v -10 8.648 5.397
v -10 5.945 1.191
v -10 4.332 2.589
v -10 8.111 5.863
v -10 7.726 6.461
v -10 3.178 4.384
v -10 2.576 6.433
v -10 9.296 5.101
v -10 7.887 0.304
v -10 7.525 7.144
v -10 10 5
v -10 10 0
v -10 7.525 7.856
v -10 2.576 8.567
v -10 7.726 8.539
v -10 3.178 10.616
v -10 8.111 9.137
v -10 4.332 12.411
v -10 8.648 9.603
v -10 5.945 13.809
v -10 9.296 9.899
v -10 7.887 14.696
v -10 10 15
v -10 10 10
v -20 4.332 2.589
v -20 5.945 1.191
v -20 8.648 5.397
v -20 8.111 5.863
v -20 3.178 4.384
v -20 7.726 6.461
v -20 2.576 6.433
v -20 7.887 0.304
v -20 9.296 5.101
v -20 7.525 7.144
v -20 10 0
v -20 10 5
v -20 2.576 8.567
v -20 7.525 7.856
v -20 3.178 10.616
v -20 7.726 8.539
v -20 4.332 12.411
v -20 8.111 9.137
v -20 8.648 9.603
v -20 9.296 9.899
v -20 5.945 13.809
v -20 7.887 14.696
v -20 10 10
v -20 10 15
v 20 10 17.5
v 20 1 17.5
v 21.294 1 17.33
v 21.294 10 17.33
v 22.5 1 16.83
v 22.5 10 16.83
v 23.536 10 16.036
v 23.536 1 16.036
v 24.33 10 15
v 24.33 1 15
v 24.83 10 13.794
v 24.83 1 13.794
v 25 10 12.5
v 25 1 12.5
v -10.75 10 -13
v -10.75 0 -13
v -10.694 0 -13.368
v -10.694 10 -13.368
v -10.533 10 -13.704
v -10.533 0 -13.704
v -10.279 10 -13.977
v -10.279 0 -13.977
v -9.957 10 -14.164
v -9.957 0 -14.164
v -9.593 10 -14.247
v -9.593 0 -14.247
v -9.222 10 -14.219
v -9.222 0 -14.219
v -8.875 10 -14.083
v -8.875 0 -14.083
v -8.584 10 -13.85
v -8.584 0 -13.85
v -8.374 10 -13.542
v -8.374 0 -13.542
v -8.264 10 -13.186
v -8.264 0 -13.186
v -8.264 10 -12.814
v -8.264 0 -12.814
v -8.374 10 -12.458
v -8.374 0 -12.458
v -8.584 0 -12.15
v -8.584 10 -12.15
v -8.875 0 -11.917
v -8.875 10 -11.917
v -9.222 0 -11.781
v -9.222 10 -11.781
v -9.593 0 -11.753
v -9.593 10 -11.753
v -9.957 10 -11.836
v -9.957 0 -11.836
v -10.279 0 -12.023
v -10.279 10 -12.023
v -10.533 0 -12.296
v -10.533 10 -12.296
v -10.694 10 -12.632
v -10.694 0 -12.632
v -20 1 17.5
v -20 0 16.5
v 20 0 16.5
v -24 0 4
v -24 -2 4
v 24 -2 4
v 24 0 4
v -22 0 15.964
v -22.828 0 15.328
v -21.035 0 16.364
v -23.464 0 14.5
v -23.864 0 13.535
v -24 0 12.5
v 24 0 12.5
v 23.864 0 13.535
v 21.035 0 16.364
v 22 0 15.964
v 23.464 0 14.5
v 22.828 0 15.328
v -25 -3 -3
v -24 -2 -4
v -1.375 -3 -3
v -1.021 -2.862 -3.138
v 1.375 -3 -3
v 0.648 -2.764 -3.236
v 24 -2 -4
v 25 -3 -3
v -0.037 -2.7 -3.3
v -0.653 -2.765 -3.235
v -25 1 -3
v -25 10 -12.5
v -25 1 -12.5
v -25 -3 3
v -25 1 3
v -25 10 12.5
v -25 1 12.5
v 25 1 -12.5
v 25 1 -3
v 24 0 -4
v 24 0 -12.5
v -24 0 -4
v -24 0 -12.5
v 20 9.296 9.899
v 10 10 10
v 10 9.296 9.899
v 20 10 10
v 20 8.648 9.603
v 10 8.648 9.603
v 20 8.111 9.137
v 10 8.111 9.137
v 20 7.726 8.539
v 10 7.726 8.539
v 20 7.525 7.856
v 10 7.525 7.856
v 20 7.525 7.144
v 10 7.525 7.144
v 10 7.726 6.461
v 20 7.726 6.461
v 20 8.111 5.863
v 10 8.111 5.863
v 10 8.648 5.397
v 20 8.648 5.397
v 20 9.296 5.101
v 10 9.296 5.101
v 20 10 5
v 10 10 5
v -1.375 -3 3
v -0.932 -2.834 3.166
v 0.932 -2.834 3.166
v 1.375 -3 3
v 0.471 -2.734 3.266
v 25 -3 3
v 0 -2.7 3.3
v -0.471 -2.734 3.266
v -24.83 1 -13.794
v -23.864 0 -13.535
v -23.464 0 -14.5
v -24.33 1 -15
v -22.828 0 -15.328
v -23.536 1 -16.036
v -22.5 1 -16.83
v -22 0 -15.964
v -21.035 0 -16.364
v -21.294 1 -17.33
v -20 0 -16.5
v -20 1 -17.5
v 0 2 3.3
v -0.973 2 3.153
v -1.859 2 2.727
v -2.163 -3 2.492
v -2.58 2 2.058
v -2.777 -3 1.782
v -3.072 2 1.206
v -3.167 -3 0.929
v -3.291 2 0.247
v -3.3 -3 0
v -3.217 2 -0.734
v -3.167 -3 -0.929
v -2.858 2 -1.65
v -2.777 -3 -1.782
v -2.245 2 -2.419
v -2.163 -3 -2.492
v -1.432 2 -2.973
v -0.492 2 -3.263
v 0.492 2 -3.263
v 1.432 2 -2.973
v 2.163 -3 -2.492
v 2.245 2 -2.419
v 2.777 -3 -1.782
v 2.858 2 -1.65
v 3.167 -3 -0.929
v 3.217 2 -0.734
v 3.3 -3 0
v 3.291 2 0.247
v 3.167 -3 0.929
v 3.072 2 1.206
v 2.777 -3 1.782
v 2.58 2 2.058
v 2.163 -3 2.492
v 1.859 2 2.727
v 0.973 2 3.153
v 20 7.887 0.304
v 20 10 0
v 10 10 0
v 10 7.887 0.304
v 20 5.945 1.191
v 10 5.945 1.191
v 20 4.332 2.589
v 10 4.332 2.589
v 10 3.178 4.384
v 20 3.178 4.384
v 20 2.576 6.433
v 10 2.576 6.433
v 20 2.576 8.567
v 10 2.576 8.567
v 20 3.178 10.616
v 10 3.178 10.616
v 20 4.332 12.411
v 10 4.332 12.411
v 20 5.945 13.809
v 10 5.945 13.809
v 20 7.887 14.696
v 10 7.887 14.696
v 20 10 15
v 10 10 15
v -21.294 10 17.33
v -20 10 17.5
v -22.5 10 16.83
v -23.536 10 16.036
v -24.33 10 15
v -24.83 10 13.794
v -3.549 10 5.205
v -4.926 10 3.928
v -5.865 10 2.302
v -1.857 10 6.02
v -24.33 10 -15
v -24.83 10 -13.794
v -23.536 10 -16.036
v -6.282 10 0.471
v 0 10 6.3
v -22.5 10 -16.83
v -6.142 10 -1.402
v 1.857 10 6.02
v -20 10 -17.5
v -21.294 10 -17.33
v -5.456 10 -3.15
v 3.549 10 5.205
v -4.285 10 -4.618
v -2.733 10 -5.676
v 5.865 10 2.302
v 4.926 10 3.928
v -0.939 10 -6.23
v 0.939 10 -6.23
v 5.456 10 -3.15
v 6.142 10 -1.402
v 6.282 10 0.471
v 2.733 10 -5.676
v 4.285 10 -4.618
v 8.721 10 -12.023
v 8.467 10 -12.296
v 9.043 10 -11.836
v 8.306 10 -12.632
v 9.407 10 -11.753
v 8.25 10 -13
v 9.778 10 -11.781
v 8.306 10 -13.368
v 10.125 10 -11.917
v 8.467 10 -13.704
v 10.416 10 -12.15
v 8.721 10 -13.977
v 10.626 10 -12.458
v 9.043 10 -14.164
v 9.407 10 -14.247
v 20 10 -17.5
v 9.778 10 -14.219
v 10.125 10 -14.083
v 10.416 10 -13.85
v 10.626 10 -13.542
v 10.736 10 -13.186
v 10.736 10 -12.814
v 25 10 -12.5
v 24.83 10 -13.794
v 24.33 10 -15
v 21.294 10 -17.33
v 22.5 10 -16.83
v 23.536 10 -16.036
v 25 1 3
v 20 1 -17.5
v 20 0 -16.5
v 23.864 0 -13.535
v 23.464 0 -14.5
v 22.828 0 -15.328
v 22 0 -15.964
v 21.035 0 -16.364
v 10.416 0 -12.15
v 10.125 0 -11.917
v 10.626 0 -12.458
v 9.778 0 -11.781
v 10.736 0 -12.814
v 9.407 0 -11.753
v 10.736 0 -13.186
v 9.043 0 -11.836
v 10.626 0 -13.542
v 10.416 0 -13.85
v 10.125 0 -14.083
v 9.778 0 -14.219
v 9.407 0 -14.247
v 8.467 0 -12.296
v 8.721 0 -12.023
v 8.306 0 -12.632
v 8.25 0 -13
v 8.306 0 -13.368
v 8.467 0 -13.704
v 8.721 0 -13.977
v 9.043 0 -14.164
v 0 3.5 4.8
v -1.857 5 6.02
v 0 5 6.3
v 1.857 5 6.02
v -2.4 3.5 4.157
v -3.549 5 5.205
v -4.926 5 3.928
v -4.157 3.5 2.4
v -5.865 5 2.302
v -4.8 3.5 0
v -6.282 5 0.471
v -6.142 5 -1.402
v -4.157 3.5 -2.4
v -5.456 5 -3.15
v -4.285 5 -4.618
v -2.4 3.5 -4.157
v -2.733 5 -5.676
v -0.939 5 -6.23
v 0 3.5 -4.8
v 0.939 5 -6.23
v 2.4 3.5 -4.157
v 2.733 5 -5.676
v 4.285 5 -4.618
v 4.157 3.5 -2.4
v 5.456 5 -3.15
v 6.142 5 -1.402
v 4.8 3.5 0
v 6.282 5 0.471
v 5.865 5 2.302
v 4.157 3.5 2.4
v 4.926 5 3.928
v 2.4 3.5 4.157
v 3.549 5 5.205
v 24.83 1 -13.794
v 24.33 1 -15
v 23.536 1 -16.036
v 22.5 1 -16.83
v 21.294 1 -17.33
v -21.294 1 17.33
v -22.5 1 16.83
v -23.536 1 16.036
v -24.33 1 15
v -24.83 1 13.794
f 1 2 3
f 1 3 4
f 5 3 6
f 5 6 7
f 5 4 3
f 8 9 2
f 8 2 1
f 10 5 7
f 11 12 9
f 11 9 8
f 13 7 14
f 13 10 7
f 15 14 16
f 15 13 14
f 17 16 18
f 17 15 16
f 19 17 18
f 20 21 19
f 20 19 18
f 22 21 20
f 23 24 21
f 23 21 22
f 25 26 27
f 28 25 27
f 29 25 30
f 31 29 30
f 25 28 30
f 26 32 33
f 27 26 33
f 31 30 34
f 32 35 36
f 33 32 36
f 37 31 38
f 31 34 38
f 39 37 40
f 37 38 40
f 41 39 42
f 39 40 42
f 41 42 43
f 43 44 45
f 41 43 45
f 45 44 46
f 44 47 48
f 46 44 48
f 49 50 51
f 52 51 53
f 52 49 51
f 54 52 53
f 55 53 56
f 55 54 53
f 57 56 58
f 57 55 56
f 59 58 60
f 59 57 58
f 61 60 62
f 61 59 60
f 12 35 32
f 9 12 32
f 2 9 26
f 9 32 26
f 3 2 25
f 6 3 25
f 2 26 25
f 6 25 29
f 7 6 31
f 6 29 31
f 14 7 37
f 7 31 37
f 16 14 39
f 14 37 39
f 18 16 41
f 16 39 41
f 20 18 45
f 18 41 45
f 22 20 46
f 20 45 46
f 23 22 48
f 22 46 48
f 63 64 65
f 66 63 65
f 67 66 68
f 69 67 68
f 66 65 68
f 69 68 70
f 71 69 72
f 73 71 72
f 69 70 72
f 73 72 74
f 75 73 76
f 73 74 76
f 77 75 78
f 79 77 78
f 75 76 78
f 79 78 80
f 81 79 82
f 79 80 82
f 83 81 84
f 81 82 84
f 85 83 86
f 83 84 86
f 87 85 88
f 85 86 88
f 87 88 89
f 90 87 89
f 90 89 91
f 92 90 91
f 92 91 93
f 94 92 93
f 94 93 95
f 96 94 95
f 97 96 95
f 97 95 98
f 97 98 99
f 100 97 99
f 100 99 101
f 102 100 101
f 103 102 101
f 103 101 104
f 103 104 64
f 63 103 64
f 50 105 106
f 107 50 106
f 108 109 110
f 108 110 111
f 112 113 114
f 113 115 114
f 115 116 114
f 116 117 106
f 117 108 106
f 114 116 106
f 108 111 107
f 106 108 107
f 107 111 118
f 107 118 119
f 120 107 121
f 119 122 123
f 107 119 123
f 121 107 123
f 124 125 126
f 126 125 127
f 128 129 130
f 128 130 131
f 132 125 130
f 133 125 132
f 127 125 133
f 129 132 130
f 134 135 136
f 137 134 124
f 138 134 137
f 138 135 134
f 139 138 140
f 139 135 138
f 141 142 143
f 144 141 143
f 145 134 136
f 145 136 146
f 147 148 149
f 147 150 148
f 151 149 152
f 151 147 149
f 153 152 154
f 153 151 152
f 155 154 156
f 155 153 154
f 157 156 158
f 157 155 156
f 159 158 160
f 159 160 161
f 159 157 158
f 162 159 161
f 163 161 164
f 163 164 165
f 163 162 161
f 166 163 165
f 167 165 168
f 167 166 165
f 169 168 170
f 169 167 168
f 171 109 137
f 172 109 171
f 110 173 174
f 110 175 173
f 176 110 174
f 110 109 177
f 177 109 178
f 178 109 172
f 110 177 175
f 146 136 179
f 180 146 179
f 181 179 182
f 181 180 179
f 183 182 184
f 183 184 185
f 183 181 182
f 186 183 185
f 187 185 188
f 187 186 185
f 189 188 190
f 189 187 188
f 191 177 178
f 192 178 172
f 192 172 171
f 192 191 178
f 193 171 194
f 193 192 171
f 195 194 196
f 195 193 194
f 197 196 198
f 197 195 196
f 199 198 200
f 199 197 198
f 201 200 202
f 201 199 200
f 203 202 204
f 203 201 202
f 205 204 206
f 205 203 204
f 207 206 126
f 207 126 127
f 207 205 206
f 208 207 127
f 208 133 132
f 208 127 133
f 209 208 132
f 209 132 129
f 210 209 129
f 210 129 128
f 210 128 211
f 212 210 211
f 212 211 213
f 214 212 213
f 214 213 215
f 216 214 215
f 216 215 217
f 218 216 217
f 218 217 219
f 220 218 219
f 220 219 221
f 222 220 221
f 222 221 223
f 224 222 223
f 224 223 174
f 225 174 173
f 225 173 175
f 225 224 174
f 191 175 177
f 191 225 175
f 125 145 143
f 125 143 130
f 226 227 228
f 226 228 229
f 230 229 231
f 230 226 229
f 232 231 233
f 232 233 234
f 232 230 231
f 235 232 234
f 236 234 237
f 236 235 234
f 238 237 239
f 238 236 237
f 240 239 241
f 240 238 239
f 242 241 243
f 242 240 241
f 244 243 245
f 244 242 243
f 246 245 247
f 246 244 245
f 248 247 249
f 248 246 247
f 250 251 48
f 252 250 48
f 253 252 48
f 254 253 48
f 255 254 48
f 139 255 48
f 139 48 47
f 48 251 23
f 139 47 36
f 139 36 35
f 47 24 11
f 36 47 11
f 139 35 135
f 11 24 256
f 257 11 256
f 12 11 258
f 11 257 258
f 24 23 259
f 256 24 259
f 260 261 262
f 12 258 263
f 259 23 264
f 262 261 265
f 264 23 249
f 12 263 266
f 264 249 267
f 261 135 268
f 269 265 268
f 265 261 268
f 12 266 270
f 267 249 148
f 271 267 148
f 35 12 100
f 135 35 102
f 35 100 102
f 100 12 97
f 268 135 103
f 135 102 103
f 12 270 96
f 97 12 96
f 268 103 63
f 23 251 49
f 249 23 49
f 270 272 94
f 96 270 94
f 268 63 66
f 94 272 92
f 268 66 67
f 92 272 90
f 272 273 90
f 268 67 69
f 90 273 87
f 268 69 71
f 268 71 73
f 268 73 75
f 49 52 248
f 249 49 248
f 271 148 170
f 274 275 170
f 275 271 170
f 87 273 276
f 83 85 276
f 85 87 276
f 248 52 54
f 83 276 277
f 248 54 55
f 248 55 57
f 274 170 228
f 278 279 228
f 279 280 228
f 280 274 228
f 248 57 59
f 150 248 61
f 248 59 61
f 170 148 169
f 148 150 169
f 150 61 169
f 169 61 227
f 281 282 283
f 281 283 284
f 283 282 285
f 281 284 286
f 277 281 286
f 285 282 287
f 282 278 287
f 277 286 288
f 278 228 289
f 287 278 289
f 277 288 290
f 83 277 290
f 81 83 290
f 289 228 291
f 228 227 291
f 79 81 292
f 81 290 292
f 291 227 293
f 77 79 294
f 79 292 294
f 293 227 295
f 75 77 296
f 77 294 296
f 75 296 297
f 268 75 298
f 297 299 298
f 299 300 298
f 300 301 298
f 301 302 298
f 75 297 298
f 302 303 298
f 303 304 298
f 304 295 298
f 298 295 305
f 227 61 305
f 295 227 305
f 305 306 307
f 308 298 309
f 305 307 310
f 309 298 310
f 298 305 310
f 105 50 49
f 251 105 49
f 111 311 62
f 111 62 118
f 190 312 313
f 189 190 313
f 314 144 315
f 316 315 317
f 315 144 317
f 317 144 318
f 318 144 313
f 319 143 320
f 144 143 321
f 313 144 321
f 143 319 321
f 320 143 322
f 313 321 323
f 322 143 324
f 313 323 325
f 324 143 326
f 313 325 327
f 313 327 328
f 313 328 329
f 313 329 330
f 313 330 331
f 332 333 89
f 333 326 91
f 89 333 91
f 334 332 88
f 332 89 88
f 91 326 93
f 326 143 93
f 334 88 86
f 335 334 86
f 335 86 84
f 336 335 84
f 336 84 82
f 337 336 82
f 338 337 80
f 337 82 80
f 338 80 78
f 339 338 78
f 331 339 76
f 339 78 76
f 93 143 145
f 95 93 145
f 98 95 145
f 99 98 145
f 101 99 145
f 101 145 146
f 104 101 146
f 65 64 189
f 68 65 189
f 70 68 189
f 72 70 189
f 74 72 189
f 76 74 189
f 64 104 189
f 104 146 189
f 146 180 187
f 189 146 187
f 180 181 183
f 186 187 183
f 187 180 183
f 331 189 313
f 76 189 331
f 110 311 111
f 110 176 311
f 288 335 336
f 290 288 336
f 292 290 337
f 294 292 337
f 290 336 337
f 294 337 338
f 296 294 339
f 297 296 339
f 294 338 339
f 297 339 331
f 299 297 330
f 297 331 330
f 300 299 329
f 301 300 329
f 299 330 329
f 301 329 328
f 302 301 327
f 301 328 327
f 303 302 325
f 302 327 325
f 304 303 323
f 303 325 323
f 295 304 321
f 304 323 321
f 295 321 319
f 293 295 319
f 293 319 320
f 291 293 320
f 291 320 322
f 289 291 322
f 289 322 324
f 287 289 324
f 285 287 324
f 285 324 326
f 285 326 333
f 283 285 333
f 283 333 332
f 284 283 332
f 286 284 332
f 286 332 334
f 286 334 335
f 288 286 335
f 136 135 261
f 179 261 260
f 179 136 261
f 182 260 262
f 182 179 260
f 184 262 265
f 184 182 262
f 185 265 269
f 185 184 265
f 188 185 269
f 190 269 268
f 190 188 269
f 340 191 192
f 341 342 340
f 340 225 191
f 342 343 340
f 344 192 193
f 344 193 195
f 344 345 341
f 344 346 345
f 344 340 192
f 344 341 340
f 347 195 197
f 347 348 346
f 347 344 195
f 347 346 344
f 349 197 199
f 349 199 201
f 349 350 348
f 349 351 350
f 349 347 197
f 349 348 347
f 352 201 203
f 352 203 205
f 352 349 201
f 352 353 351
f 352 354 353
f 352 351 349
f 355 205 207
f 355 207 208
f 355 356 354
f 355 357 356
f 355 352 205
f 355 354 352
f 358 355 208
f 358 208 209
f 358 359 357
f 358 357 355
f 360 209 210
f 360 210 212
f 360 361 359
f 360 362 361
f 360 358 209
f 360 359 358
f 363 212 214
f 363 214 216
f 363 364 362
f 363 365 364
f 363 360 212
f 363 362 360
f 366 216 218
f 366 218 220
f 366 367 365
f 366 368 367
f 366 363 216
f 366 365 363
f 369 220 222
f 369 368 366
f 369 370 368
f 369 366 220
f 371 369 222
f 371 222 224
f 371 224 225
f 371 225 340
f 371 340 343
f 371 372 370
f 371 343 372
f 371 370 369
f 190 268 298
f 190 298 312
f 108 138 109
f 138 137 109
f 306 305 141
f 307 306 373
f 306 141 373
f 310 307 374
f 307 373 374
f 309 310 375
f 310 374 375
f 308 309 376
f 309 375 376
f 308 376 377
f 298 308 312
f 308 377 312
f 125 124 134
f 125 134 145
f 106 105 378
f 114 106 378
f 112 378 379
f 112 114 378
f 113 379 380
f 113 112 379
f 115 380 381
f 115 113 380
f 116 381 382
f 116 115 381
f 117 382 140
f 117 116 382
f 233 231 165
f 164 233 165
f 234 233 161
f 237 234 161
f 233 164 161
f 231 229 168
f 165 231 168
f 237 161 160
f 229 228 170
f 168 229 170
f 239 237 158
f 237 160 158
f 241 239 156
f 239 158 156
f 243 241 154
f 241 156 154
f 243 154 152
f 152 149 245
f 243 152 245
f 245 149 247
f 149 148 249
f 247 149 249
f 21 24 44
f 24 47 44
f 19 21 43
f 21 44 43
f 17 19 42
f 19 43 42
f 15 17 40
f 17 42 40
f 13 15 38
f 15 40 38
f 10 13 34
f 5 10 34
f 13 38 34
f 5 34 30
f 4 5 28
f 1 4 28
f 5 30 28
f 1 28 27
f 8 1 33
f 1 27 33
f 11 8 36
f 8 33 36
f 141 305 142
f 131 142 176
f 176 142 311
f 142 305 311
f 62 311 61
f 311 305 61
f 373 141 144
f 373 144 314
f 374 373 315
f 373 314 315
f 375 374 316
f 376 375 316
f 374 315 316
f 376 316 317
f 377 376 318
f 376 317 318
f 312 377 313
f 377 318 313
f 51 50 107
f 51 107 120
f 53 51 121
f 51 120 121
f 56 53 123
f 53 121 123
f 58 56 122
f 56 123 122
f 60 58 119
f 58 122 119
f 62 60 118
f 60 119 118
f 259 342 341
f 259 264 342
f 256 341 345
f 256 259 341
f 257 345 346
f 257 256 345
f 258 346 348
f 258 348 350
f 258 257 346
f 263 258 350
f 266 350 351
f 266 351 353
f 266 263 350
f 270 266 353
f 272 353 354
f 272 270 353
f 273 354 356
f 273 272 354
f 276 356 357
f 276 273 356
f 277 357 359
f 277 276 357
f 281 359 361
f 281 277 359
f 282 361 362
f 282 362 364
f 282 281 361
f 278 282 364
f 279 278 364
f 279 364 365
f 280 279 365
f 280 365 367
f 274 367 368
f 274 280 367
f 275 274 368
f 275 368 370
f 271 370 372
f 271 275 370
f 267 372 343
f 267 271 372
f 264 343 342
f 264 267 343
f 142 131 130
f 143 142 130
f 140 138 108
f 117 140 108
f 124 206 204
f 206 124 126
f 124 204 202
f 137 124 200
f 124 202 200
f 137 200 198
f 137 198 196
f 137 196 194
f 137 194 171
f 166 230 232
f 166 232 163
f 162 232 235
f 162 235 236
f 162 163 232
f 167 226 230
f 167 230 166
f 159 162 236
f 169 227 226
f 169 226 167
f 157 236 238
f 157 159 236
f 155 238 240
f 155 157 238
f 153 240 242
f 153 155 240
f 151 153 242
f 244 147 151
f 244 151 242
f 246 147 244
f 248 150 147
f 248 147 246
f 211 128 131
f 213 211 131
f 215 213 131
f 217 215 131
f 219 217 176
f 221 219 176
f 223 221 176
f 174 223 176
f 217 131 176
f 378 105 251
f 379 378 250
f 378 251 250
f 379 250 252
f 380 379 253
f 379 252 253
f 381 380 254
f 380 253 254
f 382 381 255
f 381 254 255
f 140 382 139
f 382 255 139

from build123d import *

# Parameters (mm, degrees)
BOSS_EXTRUDE1_DEPTH   = 25
CUT_EXTRUDE1_DEPTH    = 5
FILLET1_R             = 5
CHAMFER1_SIZE         = 1
M3X0_5_TAPPED_HOLE1_D = 2.5


with BuildPart() as part:
    # Sketch1 → Boss-Extrude1 (new, symmetric)
    with BuildSketch(Plane(origin=(0, 0, 0), x_dir=(0, 0, -1), z_dir=(1, 0, 0))):
        Polygon((-17.5, 10), (17.5, 10), (17.5, 0), (4, 0), (4, -3), (-4, -3), (-4, 0), (-17.5, 0), align=None)
    extrude(amount=BOSS_EXTRUDE1_DEPTH, both=True)

    # Sketch3 → CSK for M6 Flat Head Machine Screw1 (revolve, cut)
    with BuildSketch(Plane(origin=(0, 10, 0), x_dir=(0, 0, 1), z_dir=(1, 0, 0))):
        Polygon((0, 0), (0, 13), (3.3, 13), (3.3, 8), (6.3, 5), (6.3, 0), align=None)
    revolve(axis=Axis((0, 16.35, 0), (0, -1, 0)), mode=Mode.SUBTRACT)

    # Sketch4 → Cut-Extrude1 (cut, symmetric)
    with BuildSketch(Plane(origin=(15, 0, 0), x_dir=(0, 0, -1), z_dir=(1, 0, 0))):
        with BuildLine():
            Line((-15, 10), (-10, 10))
            ThreePointArc((-10, 10), (-7.5, 7.5), (-5, 10))
            Line((-5, 10), (0, 10))
            ThreePointArc((0, 10), (-7.5, 2.5), (-15, 10))
        make_face()
    cut_extrude1 = extrude(amount=CUT_EXTRUDE1_DEPTH, both=True, mode=Mode.SUBTRACT)

    # Mirror1: Cut-Extrude1 across plane
    add(cut_extrude1.mirror(Plane(origin=(0, 0, 0), x_dir=(0, 0, 1), z_dir=(1, 0, 0))), mode=Mode.SUBTRACT)

    # Fillet1
    fillet1_edges = [part.edges().sort_by_distance(p)[0] for p in [
        (-25, 5, 17.5),
        (25, 5, -17.5),
        (25, 5, 17.5),
        (-25, 5, -17.5),
    ]]
    fillet(fillet1_edges, radius=FILLET1_R)

    # Chamfer1
    # the kernel refuses this chamfer: 1 mm, written as the material it takes off along each edge
    with BuildSketch(Plane(origin=(-25, -5.571682988, 4), x_dir=(-0.027495876610585623, 0, -0.9996219169112968), z_dir=(0, 1, 0)), Plane(origin=(-25, 0, -4), x_dir=(-0.027495876610585623, 0, 0.9996219169112968), z_dir=(0, -1, 0))) as chamfer1_piece_1:
        Polygon((CHAMFER1_SIZE * 0.999621916911, -CHAMFER1_SIZE * 0.0274958766106), (-CHAMFER1_SIZE * 0.0274958766106, -CHAMFER1_SIZE * 0.999621916911), (0, 0), align=None)
    extrude(amount=5.571682988, mode=Mode.SUBTRACT)
    with BuildSketch(Plane(origin=(25, -5.571682988, 4), x_dir=(0.027495876610585623, 0, -0.9996219169112968), z_dir=(0, 1, 0)), Plane(origin=(25, 0, -4), x_dir=(0.027495876610585623, 0, 0.9996219169112968), z_dir=(0, -1, 0))) as chamfer1_piece_2:
        Polygon((CHAMFER1_SIZE * 0.999621916911, CHAMFER1_SIZE * 0.0274958766106), (-CHAMFER1_SIZE * 0.0274958766106, CHAMFER1_SIZE * 0.999621916911), (0, 0), align=None)
    extrude(amount=5.571682988, mode=Mode.SUBTRACT)
    with BuildSketch(Plane(origin=(27.571682988, -3, -4), x_dir=(0, 0.9996219169112968, -0.027495876610586494), z_dir=(-1, 0, 0))) as chamfer1_piece_3:
        Polygon((CHAMFER1_SIZE * 0.999621916911, -CHAMFER1_SIZE * 0.0274958766106), (-CHAMFER1_SIZE * 0.0274958766106, -CHAMFER1_SIZE * 0.999621916911), (0, 0), align=None)
    extrude(amount=55.143365976, mode=Mode.SUBTRACT)
    with BuildSketch(Plane(origin=(27.571682988, -3, 4), x_dir=(0, 0.9996219169112968, 0.027495876610586494), z_dir=(-1, 0, 0))) as chamfer1_piece_4:
        Polygon((CHAMFER1_SIZE * 0.999621916911, CHAMFER1_SIZE * 0.0274958766106), (-CHAMFER1_SIZE * 0.0274958766106, CHAMFER1_SIZE * 0.999621916911), (0, 0), align=None)
    extrude(amount=55.143365976, mode=Mode.SUBTRACT)
    with BuildSketch(Plane(origin=(25, 0, -12.5), x_dir=(0.027495876610585623, 0.9996219169112968, 0), z_dir=(0, 0, 1)), Plane(origin=(25, 0, 4), x_dir=(0.02749587661058563, 0.9996219169112968, 0), z_dir=(0, 0, 1))) as chamfer1_piece_5:
        Polygon((CHAMFER1_SIZE * 0.999621916911, CHAMFER1_SIZE * 0.0274958766106), (-CHAMFER1_SIZE * 0.0274958766106, CHAMFER1_SIZE * 0.999621916911), (0, 0), align=None)
    extrude(amount=8.5, mode=Mode.SUBTRACT)
    with BuildSketch(Plane(origin=(-25, 0, 4), x_dir=(-0.02749587661058563, 0.9996219169112968, 0), z_dir=(0, 0, 1)), Plane(origin=(-25, 0, -12.5), x_dir=(-0.027495876610585623, 0.9996219169112968, 0), z_dir=(0, 0, 1))) as chamfer1_piece_6:
        Polygon((CHAMFER1_SIZE * 0.999621916911, -CHAMFER1_SIZE * 0.0274958766106), (-CHAMFER1_SIZE * 0.0274958766106, -CHAMFER1_SIZE * 0.999621916911), (0, 0), align=None)
    extrude(amount=8.5, mode=Mode.SUBTRACT)
    with BuildSketch(Plane(origin=(-20, 0, 17.5), x_dir=(0, 0.9996219169112968, 0.02749587661058563), z_dir=(1, 0, 0)), Plane(origin=(20, 0, -17.5), x_dir=(0, 0.9996219169112968, -0.027495876610585623), z_dir=(-1, 0, 0))) as chamfer1_piece_7:
        Polygon((CHAMFER1_SIZE * 0.999621916911, -CHAMFER1_SIZE * 0.0274958766106), (-CHAMFER1_SIZE * 0.0274958766106, -CHAMFER1_SIZE * 0.999621916911), (0, 0), align=None)
    extrude(amount=40, mode=Mode.SUBTRACT)
    with BuildSketch(Plane(origin=(-20, 0, 12.5), x_dir=(0, 0, 1), z_dir=(1, 0, 0))) as chamfer1_piece_8:
        Polygon((5, -CHAMFER1_SIZE), (5 - CHAMFER1_SIZE, 0), (5, 0), align=None)
    revolve(axis=Axis((-20, 0, 12.5), (0, -1, 0)), revolution_arc=90, mode=Mode.SUBTRACT)
    with BuildSketch(Plane(origin=(20, 0, 12.5), x_dir=(0, 0, 1), z_dir=(-1, 0, 0))) as chamfer1_piece_9:
        Polygon((5, CHAMFER1_SIZE), (5 - CHAMFER1_SIZE, 0), (5, 0), align=None)
    revolve(axis=Axis((20, 0, 12.5), (0, 1, 0)), revolution_arc=90, mode=Mode.SUBTRACT)
    with BuildSketch(Plane(origin=(-20, 0, -12.5), x_dir=(-1, 0, 0), z_dir=(0, 0, 1))) as chamfer1_piece_10:
        Polygon((5, -CHAMFER1_SIZE), (5 - CHAMFER1_SIZE, 0), (5, 0), align=None)
    revolve(axis=Axis((-20, 0, -12.5), (0, -1, 0)), revolution_arc=90, mode=Mode.SUBTRACT)
    with BuildSketch(Plane(origin=(20, 0, -12.5), x_dir=(1, 0, 0), z_dir=(0, 0, 1))) as chamfer1_piece_11:
        Polygon((5, CHAMFER1_SIZE), (5 - CHAMFER1_SIZE, 0), (5, 0), align=None)
    revolve(axis=Axis((20, 0, -12.5), (0, 1, 0)), revolution_arc=90, mode=Mode.SUBTRACT)
    with BuildSketch(Plane(origin=(-25, 0, 1.428317012), x_dir=(-0.02749587661058563, 0.9996219169112968, 0), z_dir=(0, 0, 1))) as chamfer1_piece_12a_section:
        Polygon((CHAMFER1_SIZE * 0.999621916911, -CHAMFER1_SIZE * 0.0274958766106), (-CHAMFER1_SIZE * 0.0274958766106, -CHAMFER1_SIZE * 0.999621916911), (0, 0), align=None)
    chamfer1_piece_12a = extrude(amount=11.071682988, mode=Mode.PRIVATE)
    chamfer1_piece_12a = split(chamfer1_piece_12a, bisect_by=Plane(origin=(-24.670206373, 0.329793627, 4), z_dir=(0, 0, -1)), keep=Keep.TOP, mode=Mode.PRIVATE)
    with BuildSketch(Plane(origin=(-25, -5.571682988, 4), x_dir=(-0.027495876610585623, 0, -0.9996219169112968), z_dir=(0, 1, 0))) as chamfer1_piece_12b_section:
        Polygon((CHAMFER1_SIZE * 0.999621916911, -CHAMFER1_SIZE * 0.0274958766106), (-CHAMFER1_SIZE * 0.0274958766106, -CHAMFER1_SIZE * 0.999621916911), (0, 0), align=None)
    chamfer1_piece_12b = extrude(amount=8.143365976, mode=Mode.PRIVATE)
    chamfer1_piece_12b = split(chamfer1_piece_12b, bisect_by=Plane(origin=(-24.670206373, 0, 3.670206373), z_dir=(0, 1, 0)), keep=Keep.TOP, mode=Mode.PRIVATE)
    chamfer1_piece_12 = chamfer1_piece_12a & chamfer1_piece_12b
    add(chamfer1_piece_12, mode=Mode.SUBTRACT)
    with BuildSketch(Plane(origin=(25, 0, 1.428317012), x_dir=(0.02749587661058563, 0.9996219169112968, 0), z_dir=(0, 0, 1))) as chamfer1_piece_13a_section:
        Polygon((CHAMFER1_SIZE * 0.999621916911, CHAMFER1_SIZE * 0.0274958766106), (-CHAMFER1_SIZE * 0.0274958766106, CHAMFER1_SIZE * 0.999621916911), (0, 0), align=None)
    chamfer1_piece_13a = extrude(amount=11.071682988, mode=Mode.PRIVATE)
    chamfer1_piece_13a = split(chamfer1_piece_13a, bisect_by=Plane(origin=(24.670206373, 0.329793627, 4), z_dir=(0, 0, -1)), keep=Keep.TOP, mode=Mode.PRIVATE)
    with BuildSketch(Plane(origin=(25, -5.571682988, 4), x_dir=(0.027495876610585623, 0, -0.9996219169112968), z_dir=(0, 1, 0))) as chamfer1_piece_13b_section:
        Polygon((CHAMFER1_SIZE * 0.999621916911, CHAMFER1_SIZE * 0.0274958766106), (-CHAMFER1_SIZE * 0.0274958766106, CHAMFER1_SIZE * 0.999621916911), (0, 0), align=None)
    chamfer1_piece_13b = extrude(amount=8.143365976, mode=Mode.PRIVATE)
    chamfer1_piece_13b = split(chamfer1_piece_13b, bisect_by=Plane(origin=(24.670206373, 0, 3.670206373), z_dir=(0, 1, 0)), keep=Keep.TOP, mode=Mode.PRIVATE)
    chamfer1_piece_13 = chamfer1_piece_13a & chamfer1_piece_13b
    add(chamfer1_piece_13, mode=Mode.SUBTRACT)
    with BuildSketch(Plane(origin=(25, 0, -12.5), x_dir=(0.027495876610585623, 0.9996219169112968, 0), z_dir=(0, 0, 1))) as chamfer1_piece_14a_section:
        Polygon((CHAMFER1_SIZE * 0.999621916911, CHAMFER1_SIZE * 0.0274958766106), (-CHAMFER1_SIZE * 0.0274958766106, CHAMFER1_SIZE * 0.999621916911), (0, 0), align=None)
    chamfer1_piece_14a = extrude(amount=11.071682988, mode=Mode.PRIVATE)
    chamfer1_piece_14a = split(chamfer1_piece_14a, bisect_by=Plane(origin=(24.670206373, 0.329793627, -4), z_dir=(0, 0, 1)), keep=Keep.TOP, mode=Mode.PRIVATE)
    with BuildSketch(Plane(origin=(25, 2.571682988, -4), x_dir=(0.027495876610585623, 0, 0.9996219169112968), z_dir=(0, -1, 0))) as chamfer1_piece_14b_section:
        Polygon((CHAMFER1_SIZE * 0.999621916911, CHAMFER1_SIZE * 0.0274958766106), (-CHAMFER1_SIZE * 0.0274958766106, CHAMFER1_SIZE * 0.999621916911), (0, 0), align=None)
    chamfer1_piece_14b = extrude(amount=8.143365976, mode=Mode.PRIVATE)
    chamfer1_piece_14b = split(chamfer1_piece_14b, bisect_by=Plane(origin=(24.670206373, 0, -3.670206373), z_dir=(0, 1, 0)), keep=Keep.TOP, mode=Mode.PRIVATE)
    chamfer1_piece_14 = chamfer1_piece_14a & chamfer1_piece_14b
    add(chamfer1_piece_14, mode=Mode.SUBTRACT)
    with BuildSketch(Plane(origin=(-25, 0, -12.5), x_dir=(-0.027495876610585623, 0.9996219169112968, 0), z_dir=(0, 0, 1))) as chamfer1_piece_15a_section:
        Polygon((CHAMFER1_SIZE * 0.999621916911, -CHAMFER1_SIZE * 0.0274958766106), (-CHAMFER1_SIZE * 0.0274958766106, -CHAMFER1_SIZE * 0.999621916911), (0, 0), align=None)
    chamfer1_piece_15a = extrude(amount=11.071682988, mode=Mode.PRIVATE)
    chamfer1_piece_15a = split(chamfer1_piece_15a, bisect_by=Plane(origin=(-24.670206373, 0.329793627, -4), z_dir=(0, 0, 1)), keep=Keep.TOP, mode=Mode.PRIVATE)
    with BuildSketch(Plane(origin=(-25, 2.571682988, -4), x_dir=(-0.027495876610585623, 0, 0.9996219169112968), z_dir=(0, -1, 0))) as chamfer1_piece_15b_section:
        Polygon((CHAMFER1_SIZE * 0.999621916911, -CHAMFER1_SIZE * 0.0274958766106), (-CHAMFER1_SIZE * 0.0274958766106, -CHAMFER1_SIZE * 0.999621916911), (0, 0), align=None)
    chamfer1_piece_15b = extrude(amount=8.143365976, mode=Mode.PRIVATE)
    chamfer1_piece_15b = split(chamfer1_piece_15b, bisect_by=Plane(origin=(-24.670206373, 0, -3.670206373), z_dir=(0, 1, 0)), keep=Keep.TOP, mode=Mode.PRIVATE)
    chamfer1_piece_15 = chamfer1_piece_15a & chamfer1_piece_15b
    add(chamfer1_piece_15, mode=Mode.SUBTRACT)

    # M3x0.5 Tapped Hole1 (through all)
    with Locations(Plane(origin=(0, 10, 0), x_dir=(1, 0, 0), z_dir=(0, 1, 0))):
        with Locations((-9.5, 13), (9.5, 13)):
            Hole(M3X0_5_TAPPED_HOLE1_D / 2)


solid = part.part
